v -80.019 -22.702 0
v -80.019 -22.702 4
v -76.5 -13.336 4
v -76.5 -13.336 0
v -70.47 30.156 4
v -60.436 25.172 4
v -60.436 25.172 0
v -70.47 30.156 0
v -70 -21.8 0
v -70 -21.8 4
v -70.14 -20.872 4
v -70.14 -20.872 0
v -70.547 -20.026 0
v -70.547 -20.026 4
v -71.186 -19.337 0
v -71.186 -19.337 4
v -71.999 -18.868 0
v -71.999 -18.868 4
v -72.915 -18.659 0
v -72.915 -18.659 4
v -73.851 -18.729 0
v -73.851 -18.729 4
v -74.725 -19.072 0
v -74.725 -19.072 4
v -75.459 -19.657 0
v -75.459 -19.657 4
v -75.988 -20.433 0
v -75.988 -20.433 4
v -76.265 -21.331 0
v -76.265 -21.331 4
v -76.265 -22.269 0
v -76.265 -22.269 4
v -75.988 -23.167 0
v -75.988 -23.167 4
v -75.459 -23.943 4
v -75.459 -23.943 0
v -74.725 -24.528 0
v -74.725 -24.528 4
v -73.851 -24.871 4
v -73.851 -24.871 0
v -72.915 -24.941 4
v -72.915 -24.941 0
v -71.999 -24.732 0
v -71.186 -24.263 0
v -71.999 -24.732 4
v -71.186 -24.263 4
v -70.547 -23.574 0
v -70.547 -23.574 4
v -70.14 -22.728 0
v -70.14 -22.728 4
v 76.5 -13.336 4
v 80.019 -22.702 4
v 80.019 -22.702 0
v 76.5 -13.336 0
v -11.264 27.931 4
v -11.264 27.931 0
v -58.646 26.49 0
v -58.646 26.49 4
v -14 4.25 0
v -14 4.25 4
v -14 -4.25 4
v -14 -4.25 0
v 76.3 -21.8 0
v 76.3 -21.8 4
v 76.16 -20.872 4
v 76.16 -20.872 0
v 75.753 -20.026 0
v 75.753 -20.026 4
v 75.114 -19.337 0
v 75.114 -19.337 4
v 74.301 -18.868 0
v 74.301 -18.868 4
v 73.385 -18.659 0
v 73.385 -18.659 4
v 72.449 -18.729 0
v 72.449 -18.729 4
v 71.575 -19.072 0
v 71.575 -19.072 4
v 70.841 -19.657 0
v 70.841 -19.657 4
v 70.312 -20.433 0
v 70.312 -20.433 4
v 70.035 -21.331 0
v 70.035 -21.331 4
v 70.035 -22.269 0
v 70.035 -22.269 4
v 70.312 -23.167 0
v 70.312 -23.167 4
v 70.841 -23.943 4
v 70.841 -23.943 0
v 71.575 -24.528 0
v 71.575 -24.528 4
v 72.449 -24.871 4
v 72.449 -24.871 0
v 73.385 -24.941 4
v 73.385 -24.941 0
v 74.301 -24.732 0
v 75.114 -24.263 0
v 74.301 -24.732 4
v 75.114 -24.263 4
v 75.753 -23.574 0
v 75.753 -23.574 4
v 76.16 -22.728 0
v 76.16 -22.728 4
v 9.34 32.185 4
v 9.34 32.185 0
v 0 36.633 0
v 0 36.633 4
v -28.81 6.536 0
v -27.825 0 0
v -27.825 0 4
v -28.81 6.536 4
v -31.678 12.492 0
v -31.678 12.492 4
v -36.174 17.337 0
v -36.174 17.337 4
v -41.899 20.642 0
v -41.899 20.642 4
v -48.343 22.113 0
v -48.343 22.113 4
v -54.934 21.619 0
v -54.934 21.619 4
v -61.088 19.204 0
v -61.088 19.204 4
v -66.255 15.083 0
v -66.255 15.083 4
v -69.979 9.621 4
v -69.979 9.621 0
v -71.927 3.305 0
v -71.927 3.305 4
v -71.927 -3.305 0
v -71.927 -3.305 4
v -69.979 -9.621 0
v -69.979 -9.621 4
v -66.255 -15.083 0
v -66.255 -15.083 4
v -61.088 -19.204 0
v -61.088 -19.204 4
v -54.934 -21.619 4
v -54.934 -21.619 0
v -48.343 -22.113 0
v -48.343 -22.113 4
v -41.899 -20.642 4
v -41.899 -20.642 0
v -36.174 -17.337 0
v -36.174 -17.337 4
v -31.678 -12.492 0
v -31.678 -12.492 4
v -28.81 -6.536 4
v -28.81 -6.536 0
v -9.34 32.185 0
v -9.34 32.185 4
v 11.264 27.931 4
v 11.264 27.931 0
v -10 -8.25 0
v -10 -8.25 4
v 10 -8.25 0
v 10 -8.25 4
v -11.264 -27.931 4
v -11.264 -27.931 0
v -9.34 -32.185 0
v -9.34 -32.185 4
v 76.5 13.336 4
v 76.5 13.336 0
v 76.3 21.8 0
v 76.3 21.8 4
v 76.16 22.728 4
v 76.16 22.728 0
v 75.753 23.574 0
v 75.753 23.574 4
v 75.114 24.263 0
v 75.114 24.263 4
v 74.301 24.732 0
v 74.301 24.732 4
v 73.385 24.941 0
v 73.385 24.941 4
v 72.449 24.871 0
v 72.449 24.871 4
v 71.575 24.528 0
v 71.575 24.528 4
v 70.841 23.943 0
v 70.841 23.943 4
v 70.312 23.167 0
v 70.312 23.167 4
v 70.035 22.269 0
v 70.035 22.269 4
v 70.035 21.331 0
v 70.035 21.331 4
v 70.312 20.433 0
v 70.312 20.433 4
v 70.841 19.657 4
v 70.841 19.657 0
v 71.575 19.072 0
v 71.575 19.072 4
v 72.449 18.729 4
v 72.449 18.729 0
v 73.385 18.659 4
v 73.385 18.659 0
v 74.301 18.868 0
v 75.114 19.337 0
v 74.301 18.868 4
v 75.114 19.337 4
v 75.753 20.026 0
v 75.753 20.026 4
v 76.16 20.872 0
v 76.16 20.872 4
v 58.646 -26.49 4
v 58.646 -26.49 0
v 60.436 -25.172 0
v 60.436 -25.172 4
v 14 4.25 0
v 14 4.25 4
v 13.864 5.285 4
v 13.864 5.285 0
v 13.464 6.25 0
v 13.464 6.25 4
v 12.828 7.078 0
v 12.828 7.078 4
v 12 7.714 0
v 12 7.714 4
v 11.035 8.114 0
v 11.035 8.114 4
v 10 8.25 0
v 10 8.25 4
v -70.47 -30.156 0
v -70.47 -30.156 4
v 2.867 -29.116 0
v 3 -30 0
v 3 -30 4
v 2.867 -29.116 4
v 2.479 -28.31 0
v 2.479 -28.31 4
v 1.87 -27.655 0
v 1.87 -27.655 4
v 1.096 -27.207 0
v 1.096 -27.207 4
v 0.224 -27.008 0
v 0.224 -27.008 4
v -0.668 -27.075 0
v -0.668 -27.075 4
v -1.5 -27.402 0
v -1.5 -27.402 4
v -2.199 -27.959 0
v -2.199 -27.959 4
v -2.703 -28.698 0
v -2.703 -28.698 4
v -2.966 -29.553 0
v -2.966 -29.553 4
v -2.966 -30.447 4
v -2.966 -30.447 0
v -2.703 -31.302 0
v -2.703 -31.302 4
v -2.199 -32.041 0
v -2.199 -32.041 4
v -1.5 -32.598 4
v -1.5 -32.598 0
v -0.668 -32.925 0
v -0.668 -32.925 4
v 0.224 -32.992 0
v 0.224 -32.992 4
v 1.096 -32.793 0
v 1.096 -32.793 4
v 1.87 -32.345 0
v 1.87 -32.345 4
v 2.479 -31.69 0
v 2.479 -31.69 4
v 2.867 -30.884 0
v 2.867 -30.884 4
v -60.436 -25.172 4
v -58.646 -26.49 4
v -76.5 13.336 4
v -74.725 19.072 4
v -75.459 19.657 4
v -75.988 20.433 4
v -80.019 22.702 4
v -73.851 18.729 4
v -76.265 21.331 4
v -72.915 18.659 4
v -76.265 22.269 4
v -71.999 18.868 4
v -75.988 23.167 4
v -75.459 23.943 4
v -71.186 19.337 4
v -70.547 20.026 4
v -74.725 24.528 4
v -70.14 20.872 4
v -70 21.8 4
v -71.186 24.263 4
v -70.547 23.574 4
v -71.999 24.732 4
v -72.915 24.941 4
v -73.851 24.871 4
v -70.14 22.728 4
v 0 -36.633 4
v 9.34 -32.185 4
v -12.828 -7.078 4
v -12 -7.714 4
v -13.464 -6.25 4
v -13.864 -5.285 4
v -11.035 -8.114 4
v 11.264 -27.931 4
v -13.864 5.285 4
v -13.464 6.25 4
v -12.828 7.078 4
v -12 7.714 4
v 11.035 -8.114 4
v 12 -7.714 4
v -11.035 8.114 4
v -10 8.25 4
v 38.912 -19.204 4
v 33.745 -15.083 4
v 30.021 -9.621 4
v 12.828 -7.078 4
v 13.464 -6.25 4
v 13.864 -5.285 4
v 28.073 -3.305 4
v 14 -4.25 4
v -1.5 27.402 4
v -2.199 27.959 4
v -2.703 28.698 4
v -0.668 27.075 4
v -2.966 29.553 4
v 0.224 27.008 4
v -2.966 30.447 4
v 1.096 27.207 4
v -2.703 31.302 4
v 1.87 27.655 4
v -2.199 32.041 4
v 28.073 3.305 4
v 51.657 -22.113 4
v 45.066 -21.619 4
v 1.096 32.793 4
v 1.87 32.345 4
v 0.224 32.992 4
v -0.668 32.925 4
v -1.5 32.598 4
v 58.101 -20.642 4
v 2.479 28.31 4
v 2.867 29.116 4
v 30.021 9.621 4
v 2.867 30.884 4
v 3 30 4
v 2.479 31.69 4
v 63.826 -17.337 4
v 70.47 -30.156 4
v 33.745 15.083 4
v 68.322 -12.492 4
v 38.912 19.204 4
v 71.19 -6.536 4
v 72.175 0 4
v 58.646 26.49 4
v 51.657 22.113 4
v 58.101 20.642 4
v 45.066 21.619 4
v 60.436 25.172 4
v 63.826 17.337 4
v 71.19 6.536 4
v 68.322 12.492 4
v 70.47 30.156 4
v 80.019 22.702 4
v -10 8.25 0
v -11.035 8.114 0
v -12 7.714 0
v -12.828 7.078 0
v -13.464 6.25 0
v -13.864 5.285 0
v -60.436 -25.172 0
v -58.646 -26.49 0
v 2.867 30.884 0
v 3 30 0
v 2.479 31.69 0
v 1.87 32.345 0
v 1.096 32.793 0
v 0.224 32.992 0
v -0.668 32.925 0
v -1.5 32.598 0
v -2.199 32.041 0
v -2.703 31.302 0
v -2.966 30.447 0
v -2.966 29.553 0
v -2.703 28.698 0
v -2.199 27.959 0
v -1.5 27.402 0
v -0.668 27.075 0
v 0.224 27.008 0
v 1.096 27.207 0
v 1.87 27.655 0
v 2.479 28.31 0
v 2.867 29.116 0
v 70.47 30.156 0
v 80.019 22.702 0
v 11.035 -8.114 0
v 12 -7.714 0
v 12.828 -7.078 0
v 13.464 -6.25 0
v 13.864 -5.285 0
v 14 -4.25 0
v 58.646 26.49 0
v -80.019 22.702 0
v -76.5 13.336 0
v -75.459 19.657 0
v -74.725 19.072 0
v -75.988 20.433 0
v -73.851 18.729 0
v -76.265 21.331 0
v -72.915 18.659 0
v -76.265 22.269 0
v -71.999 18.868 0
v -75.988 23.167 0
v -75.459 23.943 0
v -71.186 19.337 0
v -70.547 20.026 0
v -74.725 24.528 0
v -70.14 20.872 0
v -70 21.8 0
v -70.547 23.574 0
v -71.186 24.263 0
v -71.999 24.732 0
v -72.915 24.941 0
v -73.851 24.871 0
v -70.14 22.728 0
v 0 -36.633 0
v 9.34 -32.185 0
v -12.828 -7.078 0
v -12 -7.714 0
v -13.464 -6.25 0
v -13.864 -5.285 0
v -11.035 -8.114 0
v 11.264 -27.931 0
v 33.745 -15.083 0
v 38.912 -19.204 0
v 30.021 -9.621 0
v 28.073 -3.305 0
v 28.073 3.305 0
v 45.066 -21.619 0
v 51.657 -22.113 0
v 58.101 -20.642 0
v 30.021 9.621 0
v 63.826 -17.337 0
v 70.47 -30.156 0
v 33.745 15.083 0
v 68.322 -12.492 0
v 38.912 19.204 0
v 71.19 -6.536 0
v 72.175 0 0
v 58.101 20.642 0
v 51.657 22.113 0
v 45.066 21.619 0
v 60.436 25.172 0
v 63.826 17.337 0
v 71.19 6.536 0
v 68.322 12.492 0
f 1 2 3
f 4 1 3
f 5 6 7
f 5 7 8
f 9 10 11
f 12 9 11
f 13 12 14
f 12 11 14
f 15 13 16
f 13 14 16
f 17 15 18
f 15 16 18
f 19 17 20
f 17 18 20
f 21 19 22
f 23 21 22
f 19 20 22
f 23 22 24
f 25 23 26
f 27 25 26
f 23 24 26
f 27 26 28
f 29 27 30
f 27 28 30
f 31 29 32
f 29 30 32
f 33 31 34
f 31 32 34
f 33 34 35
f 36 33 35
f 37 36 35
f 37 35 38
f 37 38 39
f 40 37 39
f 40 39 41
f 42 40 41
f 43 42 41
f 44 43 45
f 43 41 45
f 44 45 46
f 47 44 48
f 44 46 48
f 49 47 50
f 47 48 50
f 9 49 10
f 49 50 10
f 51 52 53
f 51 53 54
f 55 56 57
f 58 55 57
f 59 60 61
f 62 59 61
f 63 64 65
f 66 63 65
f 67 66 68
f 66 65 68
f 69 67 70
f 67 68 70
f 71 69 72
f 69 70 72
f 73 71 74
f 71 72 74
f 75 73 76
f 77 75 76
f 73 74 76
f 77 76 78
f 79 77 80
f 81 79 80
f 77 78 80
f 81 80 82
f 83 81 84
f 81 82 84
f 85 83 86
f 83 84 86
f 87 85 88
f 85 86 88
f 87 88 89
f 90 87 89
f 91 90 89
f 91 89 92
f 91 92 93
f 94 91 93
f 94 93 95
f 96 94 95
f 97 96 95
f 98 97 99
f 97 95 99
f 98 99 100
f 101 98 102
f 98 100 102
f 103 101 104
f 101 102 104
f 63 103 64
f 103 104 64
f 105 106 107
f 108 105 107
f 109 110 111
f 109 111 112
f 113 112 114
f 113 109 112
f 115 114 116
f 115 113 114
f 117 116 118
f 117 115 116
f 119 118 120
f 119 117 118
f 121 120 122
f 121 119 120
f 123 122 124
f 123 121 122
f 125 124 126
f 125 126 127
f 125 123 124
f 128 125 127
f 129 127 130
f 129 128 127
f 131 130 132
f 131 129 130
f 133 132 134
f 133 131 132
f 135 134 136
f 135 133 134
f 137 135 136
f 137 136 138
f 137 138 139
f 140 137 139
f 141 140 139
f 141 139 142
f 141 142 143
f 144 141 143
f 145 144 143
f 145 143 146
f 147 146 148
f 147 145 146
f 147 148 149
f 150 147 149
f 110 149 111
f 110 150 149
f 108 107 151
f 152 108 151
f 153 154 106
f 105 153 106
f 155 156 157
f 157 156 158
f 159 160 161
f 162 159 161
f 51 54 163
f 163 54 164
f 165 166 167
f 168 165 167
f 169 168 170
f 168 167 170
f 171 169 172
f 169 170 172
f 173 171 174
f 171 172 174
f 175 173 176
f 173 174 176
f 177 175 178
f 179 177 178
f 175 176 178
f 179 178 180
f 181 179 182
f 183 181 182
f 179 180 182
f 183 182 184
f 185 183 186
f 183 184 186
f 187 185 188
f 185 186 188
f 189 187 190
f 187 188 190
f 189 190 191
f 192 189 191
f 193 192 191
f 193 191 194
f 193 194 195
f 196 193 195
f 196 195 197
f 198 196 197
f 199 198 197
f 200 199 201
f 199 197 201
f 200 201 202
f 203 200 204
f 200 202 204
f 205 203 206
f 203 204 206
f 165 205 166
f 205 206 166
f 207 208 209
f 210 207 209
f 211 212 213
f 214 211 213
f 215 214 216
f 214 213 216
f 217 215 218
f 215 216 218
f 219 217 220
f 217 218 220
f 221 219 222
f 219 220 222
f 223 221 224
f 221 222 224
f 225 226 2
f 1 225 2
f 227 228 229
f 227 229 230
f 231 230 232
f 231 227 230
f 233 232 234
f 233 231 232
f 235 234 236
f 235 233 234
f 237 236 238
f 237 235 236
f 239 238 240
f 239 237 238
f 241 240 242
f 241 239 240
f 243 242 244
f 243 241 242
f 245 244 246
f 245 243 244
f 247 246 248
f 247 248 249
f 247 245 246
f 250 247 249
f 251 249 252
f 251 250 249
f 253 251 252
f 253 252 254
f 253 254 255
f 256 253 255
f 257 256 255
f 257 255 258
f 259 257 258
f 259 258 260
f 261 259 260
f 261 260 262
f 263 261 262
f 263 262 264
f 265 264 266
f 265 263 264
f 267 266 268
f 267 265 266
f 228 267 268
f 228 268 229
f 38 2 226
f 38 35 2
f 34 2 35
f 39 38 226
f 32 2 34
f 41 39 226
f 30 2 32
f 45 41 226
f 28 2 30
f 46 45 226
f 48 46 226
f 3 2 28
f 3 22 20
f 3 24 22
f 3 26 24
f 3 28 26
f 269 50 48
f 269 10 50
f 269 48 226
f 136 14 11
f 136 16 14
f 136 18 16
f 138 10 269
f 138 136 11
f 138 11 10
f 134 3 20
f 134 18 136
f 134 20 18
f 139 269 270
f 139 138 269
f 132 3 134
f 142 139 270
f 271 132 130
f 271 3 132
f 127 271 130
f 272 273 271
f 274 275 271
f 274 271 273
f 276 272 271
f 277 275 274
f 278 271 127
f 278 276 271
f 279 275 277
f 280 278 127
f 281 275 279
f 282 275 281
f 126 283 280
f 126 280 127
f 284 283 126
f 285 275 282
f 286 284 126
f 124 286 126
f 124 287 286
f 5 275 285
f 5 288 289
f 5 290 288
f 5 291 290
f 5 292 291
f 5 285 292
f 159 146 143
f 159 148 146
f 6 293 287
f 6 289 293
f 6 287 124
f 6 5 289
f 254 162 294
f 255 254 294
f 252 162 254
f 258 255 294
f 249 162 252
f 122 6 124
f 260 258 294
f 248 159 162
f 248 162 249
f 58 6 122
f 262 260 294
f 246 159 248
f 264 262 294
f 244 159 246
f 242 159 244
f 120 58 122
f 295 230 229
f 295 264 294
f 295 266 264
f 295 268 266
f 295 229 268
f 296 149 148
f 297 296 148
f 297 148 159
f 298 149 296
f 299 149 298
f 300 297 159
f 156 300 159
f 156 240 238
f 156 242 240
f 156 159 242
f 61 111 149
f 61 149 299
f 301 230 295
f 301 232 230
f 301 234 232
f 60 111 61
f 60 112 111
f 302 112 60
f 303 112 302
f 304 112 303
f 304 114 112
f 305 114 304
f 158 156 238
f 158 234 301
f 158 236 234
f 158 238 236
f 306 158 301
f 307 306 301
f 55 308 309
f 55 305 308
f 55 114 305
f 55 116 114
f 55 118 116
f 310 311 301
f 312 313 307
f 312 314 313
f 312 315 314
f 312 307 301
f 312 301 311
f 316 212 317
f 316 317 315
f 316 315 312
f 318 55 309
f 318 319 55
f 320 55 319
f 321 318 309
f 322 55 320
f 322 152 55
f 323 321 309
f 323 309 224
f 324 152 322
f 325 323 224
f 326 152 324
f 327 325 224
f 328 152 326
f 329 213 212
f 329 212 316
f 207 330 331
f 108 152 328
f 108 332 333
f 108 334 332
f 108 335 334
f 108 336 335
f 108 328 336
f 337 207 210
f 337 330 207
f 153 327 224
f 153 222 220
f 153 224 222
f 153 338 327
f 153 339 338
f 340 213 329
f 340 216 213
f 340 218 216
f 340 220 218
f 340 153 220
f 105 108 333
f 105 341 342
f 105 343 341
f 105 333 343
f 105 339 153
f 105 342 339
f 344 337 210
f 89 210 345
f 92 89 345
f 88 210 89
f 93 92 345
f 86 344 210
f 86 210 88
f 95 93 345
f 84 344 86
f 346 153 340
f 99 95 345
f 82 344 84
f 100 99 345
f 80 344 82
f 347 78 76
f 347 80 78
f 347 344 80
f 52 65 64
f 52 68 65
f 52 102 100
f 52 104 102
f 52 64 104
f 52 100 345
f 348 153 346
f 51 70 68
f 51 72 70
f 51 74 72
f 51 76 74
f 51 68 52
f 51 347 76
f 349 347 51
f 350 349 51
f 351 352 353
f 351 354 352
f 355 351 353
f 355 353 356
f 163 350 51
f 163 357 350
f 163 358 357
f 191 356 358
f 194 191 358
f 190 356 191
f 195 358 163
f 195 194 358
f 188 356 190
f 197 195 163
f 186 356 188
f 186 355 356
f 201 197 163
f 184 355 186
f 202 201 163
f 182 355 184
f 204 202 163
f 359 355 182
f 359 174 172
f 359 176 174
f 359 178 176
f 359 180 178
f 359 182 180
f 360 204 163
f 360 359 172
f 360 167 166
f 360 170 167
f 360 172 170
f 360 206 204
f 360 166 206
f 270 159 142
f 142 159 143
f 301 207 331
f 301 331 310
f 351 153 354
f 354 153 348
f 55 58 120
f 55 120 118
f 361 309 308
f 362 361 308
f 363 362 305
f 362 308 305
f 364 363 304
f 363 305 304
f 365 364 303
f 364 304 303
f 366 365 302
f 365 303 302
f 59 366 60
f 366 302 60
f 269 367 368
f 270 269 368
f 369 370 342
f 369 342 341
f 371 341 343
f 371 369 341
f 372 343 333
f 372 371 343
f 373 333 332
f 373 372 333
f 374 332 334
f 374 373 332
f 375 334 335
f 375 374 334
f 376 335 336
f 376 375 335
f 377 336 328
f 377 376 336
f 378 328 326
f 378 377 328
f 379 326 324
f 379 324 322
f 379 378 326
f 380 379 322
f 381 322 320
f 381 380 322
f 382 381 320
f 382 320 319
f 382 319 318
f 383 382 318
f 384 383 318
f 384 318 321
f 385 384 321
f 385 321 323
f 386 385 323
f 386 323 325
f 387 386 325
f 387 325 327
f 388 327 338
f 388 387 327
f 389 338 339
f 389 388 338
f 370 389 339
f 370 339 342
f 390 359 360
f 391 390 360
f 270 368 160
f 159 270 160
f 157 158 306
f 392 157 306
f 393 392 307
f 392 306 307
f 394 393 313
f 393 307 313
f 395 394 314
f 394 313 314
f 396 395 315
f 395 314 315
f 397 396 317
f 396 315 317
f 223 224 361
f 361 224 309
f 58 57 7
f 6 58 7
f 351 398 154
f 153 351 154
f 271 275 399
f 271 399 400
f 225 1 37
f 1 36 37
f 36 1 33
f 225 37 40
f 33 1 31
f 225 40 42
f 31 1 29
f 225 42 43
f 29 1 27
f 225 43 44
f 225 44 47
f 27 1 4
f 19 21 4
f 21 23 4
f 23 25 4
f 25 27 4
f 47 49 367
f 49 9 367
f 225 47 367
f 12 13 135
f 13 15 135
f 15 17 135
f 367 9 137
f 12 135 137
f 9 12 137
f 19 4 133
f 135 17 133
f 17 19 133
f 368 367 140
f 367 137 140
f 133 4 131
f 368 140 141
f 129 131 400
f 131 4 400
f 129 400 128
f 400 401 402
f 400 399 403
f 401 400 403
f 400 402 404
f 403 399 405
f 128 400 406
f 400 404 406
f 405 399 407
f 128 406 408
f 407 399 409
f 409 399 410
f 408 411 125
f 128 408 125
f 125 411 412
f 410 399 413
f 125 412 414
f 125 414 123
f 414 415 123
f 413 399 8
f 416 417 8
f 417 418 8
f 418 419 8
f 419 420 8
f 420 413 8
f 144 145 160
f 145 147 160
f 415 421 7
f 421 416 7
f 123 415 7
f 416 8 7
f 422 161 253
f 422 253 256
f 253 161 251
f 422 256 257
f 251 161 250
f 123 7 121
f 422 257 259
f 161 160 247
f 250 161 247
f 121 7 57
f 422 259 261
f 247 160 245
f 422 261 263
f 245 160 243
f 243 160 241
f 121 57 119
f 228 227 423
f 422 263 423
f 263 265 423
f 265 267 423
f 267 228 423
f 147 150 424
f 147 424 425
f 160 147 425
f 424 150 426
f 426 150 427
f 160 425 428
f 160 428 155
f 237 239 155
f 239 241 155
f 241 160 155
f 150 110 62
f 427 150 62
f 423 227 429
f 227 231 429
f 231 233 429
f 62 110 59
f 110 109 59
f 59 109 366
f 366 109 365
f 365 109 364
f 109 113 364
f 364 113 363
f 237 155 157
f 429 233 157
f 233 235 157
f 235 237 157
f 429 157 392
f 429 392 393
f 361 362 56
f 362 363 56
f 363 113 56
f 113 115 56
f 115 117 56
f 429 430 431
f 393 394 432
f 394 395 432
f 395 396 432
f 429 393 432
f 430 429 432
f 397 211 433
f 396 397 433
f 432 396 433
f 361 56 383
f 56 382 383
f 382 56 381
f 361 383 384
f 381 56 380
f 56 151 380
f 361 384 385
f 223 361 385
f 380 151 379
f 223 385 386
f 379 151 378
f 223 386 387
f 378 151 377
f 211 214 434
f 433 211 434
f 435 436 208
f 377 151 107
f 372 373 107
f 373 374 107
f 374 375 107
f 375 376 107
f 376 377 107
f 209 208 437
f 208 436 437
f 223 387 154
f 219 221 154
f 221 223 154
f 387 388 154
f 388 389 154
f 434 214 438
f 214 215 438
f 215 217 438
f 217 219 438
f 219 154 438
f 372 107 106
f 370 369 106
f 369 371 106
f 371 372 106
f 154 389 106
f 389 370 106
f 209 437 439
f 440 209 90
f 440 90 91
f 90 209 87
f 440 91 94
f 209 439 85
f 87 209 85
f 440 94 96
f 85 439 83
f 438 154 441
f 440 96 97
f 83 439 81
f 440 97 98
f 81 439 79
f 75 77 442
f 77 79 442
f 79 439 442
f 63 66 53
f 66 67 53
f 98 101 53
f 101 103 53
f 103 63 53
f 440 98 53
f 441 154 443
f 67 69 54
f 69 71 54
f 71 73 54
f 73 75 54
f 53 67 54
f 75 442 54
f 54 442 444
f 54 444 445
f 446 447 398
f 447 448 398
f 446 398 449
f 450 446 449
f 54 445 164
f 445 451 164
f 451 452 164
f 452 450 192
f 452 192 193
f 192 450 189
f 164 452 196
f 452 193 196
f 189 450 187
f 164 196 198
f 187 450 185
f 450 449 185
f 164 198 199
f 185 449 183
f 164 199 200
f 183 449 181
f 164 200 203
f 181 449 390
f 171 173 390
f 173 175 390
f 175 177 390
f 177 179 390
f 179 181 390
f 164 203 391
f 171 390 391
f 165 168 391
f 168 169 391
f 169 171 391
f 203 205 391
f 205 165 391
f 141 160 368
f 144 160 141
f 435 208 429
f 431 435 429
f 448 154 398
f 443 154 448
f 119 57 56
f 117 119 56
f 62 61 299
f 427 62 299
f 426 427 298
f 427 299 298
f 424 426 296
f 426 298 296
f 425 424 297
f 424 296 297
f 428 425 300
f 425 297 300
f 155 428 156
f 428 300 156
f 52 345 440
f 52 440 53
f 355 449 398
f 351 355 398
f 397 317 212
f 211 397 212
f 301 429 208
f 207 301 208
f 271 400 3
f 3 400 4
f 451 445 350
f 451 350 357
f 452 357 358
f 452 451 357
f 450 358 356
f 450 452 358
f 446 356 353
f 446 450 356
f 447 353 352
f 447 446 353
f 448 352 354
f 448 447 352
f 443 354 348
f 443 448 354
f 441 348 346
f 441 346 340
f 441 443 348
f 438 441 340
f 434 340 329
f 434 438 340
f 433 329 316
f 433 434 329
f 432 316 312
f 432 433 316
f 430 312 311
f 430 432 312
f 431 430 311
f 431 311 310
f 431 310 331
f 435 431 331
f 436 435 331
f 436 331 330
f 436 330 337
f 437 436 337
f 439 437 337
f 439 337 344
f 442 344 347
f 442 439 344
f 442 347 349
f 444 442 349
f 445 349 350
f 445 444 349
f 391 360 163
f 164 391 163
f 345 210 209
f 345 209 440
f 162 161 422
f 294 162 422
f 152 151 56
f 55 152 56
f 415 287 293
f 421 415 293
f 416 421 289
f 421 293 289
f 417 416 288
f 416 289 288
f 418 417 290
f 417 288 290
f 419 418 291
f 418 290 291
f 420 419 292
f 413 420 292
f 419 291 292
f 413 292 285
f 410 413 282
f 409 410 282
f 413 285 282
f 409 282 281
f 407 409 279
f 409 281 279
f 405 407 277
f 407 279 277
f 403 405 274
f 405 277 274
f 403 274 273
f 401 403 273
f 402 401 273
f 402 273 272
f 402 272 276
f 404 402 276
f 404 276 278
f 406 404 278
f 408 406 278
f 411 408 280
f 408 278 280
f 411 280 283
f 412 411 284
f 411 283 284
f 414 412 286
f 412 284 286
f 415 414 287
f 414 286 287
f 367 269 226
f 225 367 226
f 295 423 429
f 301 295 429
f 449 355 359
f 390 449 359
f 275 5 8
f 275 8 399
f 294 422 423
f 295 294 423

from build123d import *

# Parameters (mm, degrees)
SKETCH1_R           = 3
SKETCH1_R_2         = 22.175
BOSS_EXTRUDE1_DEPTH = 4
CUT_EXTRUDE1_DEPTH  = 5
SKETCH3_R           = 3.15
BOSS_EXTRUDE2_DEPTH = 4


with BuildPart() as part:
    # Sketch1 → Boss-Extrude1 (new body)
    with BuildSketch(Plane.XY):
        Polygon((0, 36.632796194), (-9.339584462, 32.184793438), (-11.263738257, 27.930920523), (-58.646229282, 26.490266956), (-76.5, 13.335918569), (-76.5, -13.335918569), (-58.646229282, -26.490266956), (-11.263738257, -27.930920523), (-9.339584462, -32.184793438), (0, -36.632796194), (9.339584462, -32.184793438), (11.263738257, -27.930920523), (58.646229282, -26.490266956), (76.5, -13.335918569), (76.5, 13.335918569), (58.646229282, 26.490266956), (11.263738257, 27.930920523), (9.339584462, 32.184793438), align=None)
        with Locations((0, 30)):
            Circle(SKETCH1_R, mode=Mode.SUBTRACT)
        with Locations((-50, 0)):
            Circle(SKETCH1_R_2, mode=Mode.SUBTRACT)
        with Locations((50, 0)):
            Circle(SKETCH1_R_2, mode=Mode.SUBTRACT)
        with Locations((0, -30)):
            Circle(SKETCH1_R, mode=Mode.SUBTRACT)
    extrude(amount=BOSS_EXTRUDE1_DEPTH)

    # Sketch2 → Cut-Extrude1 (cut, through all)
    with BuildSketch(Plane.XY.offset(4)):
        with BuildLine():
            Line((10, 8.25), (-10, 8.25))
            ThreePointArc((-10, 8.25), (-12.828427125, 7.078427125), (-14, 4.25))
            Line((-14, 4.25), (-14, -4.25))
            ThreePointArc((-14, -4.25), (-12.828427125, -7.078427125), (-10, -8.25))
            Line((-10, -8.25), (10, -8.25))
            ThreePointArc((10, -8.25), (12.828427125, -7.078427125), (14, -4.25))
            Line((14, -4.25), (14, 4.25))
            ThreePointArc((14, 4.25), (12.828427125, 7.078427125), (10, 8.25))
        make_face()
    extrude(amount=-CUT_EXTRUDE1_DEPTH, mode=Mode.SUBTRACT)

    # Sketch3 → Boss-Extrude2 (add)
    with BuildSketch(Plane.XY.offset(4)):
        Polygon((-60.436095429, 25.171524645), (-70.470429489, 30.155905977), (-80.018831674, 22.70201384), (-76.5, 13.335918569), align=None)
        with Locations((-73.15, 21.8)):
            Circle(SKETCH3_R, mode=Mode.SUBTRACT)
        Polygon((76.5, 13.335918569), (60.436095429, 25.171524645), (70.470429489, 30.155905977), (80.018831674, 22.70201384), align=None)
        with Locations((73.15, 21.8)):
            Circle(SKETCH3_R, mode=Mode.SUBTRACT)
        Polygon((60.436095429, -25.171524645), (70.470429489, -30.155905977), (80.018831674, -22.70201384), (76.5, -13.335918569), align=None)
        with Locations((73.15, -21.8)):
            Circle(SKETCH3_R, mode=Mode.SUBTRACT)
        Polygon((-76.5, -13.335918569), (-60.436095429, -25.171524645), (-70.470429489, -30.155905977), (-80.018831674, -22.70201384), align=None)
        with Locations((-73.15, -21.8)):
            Circle(SKETCH3_R, mode=Mode.SUBTRACT)
    extrude(amount=-BOSS_EXTRUDE2_DEPTH)


solid = part.part
